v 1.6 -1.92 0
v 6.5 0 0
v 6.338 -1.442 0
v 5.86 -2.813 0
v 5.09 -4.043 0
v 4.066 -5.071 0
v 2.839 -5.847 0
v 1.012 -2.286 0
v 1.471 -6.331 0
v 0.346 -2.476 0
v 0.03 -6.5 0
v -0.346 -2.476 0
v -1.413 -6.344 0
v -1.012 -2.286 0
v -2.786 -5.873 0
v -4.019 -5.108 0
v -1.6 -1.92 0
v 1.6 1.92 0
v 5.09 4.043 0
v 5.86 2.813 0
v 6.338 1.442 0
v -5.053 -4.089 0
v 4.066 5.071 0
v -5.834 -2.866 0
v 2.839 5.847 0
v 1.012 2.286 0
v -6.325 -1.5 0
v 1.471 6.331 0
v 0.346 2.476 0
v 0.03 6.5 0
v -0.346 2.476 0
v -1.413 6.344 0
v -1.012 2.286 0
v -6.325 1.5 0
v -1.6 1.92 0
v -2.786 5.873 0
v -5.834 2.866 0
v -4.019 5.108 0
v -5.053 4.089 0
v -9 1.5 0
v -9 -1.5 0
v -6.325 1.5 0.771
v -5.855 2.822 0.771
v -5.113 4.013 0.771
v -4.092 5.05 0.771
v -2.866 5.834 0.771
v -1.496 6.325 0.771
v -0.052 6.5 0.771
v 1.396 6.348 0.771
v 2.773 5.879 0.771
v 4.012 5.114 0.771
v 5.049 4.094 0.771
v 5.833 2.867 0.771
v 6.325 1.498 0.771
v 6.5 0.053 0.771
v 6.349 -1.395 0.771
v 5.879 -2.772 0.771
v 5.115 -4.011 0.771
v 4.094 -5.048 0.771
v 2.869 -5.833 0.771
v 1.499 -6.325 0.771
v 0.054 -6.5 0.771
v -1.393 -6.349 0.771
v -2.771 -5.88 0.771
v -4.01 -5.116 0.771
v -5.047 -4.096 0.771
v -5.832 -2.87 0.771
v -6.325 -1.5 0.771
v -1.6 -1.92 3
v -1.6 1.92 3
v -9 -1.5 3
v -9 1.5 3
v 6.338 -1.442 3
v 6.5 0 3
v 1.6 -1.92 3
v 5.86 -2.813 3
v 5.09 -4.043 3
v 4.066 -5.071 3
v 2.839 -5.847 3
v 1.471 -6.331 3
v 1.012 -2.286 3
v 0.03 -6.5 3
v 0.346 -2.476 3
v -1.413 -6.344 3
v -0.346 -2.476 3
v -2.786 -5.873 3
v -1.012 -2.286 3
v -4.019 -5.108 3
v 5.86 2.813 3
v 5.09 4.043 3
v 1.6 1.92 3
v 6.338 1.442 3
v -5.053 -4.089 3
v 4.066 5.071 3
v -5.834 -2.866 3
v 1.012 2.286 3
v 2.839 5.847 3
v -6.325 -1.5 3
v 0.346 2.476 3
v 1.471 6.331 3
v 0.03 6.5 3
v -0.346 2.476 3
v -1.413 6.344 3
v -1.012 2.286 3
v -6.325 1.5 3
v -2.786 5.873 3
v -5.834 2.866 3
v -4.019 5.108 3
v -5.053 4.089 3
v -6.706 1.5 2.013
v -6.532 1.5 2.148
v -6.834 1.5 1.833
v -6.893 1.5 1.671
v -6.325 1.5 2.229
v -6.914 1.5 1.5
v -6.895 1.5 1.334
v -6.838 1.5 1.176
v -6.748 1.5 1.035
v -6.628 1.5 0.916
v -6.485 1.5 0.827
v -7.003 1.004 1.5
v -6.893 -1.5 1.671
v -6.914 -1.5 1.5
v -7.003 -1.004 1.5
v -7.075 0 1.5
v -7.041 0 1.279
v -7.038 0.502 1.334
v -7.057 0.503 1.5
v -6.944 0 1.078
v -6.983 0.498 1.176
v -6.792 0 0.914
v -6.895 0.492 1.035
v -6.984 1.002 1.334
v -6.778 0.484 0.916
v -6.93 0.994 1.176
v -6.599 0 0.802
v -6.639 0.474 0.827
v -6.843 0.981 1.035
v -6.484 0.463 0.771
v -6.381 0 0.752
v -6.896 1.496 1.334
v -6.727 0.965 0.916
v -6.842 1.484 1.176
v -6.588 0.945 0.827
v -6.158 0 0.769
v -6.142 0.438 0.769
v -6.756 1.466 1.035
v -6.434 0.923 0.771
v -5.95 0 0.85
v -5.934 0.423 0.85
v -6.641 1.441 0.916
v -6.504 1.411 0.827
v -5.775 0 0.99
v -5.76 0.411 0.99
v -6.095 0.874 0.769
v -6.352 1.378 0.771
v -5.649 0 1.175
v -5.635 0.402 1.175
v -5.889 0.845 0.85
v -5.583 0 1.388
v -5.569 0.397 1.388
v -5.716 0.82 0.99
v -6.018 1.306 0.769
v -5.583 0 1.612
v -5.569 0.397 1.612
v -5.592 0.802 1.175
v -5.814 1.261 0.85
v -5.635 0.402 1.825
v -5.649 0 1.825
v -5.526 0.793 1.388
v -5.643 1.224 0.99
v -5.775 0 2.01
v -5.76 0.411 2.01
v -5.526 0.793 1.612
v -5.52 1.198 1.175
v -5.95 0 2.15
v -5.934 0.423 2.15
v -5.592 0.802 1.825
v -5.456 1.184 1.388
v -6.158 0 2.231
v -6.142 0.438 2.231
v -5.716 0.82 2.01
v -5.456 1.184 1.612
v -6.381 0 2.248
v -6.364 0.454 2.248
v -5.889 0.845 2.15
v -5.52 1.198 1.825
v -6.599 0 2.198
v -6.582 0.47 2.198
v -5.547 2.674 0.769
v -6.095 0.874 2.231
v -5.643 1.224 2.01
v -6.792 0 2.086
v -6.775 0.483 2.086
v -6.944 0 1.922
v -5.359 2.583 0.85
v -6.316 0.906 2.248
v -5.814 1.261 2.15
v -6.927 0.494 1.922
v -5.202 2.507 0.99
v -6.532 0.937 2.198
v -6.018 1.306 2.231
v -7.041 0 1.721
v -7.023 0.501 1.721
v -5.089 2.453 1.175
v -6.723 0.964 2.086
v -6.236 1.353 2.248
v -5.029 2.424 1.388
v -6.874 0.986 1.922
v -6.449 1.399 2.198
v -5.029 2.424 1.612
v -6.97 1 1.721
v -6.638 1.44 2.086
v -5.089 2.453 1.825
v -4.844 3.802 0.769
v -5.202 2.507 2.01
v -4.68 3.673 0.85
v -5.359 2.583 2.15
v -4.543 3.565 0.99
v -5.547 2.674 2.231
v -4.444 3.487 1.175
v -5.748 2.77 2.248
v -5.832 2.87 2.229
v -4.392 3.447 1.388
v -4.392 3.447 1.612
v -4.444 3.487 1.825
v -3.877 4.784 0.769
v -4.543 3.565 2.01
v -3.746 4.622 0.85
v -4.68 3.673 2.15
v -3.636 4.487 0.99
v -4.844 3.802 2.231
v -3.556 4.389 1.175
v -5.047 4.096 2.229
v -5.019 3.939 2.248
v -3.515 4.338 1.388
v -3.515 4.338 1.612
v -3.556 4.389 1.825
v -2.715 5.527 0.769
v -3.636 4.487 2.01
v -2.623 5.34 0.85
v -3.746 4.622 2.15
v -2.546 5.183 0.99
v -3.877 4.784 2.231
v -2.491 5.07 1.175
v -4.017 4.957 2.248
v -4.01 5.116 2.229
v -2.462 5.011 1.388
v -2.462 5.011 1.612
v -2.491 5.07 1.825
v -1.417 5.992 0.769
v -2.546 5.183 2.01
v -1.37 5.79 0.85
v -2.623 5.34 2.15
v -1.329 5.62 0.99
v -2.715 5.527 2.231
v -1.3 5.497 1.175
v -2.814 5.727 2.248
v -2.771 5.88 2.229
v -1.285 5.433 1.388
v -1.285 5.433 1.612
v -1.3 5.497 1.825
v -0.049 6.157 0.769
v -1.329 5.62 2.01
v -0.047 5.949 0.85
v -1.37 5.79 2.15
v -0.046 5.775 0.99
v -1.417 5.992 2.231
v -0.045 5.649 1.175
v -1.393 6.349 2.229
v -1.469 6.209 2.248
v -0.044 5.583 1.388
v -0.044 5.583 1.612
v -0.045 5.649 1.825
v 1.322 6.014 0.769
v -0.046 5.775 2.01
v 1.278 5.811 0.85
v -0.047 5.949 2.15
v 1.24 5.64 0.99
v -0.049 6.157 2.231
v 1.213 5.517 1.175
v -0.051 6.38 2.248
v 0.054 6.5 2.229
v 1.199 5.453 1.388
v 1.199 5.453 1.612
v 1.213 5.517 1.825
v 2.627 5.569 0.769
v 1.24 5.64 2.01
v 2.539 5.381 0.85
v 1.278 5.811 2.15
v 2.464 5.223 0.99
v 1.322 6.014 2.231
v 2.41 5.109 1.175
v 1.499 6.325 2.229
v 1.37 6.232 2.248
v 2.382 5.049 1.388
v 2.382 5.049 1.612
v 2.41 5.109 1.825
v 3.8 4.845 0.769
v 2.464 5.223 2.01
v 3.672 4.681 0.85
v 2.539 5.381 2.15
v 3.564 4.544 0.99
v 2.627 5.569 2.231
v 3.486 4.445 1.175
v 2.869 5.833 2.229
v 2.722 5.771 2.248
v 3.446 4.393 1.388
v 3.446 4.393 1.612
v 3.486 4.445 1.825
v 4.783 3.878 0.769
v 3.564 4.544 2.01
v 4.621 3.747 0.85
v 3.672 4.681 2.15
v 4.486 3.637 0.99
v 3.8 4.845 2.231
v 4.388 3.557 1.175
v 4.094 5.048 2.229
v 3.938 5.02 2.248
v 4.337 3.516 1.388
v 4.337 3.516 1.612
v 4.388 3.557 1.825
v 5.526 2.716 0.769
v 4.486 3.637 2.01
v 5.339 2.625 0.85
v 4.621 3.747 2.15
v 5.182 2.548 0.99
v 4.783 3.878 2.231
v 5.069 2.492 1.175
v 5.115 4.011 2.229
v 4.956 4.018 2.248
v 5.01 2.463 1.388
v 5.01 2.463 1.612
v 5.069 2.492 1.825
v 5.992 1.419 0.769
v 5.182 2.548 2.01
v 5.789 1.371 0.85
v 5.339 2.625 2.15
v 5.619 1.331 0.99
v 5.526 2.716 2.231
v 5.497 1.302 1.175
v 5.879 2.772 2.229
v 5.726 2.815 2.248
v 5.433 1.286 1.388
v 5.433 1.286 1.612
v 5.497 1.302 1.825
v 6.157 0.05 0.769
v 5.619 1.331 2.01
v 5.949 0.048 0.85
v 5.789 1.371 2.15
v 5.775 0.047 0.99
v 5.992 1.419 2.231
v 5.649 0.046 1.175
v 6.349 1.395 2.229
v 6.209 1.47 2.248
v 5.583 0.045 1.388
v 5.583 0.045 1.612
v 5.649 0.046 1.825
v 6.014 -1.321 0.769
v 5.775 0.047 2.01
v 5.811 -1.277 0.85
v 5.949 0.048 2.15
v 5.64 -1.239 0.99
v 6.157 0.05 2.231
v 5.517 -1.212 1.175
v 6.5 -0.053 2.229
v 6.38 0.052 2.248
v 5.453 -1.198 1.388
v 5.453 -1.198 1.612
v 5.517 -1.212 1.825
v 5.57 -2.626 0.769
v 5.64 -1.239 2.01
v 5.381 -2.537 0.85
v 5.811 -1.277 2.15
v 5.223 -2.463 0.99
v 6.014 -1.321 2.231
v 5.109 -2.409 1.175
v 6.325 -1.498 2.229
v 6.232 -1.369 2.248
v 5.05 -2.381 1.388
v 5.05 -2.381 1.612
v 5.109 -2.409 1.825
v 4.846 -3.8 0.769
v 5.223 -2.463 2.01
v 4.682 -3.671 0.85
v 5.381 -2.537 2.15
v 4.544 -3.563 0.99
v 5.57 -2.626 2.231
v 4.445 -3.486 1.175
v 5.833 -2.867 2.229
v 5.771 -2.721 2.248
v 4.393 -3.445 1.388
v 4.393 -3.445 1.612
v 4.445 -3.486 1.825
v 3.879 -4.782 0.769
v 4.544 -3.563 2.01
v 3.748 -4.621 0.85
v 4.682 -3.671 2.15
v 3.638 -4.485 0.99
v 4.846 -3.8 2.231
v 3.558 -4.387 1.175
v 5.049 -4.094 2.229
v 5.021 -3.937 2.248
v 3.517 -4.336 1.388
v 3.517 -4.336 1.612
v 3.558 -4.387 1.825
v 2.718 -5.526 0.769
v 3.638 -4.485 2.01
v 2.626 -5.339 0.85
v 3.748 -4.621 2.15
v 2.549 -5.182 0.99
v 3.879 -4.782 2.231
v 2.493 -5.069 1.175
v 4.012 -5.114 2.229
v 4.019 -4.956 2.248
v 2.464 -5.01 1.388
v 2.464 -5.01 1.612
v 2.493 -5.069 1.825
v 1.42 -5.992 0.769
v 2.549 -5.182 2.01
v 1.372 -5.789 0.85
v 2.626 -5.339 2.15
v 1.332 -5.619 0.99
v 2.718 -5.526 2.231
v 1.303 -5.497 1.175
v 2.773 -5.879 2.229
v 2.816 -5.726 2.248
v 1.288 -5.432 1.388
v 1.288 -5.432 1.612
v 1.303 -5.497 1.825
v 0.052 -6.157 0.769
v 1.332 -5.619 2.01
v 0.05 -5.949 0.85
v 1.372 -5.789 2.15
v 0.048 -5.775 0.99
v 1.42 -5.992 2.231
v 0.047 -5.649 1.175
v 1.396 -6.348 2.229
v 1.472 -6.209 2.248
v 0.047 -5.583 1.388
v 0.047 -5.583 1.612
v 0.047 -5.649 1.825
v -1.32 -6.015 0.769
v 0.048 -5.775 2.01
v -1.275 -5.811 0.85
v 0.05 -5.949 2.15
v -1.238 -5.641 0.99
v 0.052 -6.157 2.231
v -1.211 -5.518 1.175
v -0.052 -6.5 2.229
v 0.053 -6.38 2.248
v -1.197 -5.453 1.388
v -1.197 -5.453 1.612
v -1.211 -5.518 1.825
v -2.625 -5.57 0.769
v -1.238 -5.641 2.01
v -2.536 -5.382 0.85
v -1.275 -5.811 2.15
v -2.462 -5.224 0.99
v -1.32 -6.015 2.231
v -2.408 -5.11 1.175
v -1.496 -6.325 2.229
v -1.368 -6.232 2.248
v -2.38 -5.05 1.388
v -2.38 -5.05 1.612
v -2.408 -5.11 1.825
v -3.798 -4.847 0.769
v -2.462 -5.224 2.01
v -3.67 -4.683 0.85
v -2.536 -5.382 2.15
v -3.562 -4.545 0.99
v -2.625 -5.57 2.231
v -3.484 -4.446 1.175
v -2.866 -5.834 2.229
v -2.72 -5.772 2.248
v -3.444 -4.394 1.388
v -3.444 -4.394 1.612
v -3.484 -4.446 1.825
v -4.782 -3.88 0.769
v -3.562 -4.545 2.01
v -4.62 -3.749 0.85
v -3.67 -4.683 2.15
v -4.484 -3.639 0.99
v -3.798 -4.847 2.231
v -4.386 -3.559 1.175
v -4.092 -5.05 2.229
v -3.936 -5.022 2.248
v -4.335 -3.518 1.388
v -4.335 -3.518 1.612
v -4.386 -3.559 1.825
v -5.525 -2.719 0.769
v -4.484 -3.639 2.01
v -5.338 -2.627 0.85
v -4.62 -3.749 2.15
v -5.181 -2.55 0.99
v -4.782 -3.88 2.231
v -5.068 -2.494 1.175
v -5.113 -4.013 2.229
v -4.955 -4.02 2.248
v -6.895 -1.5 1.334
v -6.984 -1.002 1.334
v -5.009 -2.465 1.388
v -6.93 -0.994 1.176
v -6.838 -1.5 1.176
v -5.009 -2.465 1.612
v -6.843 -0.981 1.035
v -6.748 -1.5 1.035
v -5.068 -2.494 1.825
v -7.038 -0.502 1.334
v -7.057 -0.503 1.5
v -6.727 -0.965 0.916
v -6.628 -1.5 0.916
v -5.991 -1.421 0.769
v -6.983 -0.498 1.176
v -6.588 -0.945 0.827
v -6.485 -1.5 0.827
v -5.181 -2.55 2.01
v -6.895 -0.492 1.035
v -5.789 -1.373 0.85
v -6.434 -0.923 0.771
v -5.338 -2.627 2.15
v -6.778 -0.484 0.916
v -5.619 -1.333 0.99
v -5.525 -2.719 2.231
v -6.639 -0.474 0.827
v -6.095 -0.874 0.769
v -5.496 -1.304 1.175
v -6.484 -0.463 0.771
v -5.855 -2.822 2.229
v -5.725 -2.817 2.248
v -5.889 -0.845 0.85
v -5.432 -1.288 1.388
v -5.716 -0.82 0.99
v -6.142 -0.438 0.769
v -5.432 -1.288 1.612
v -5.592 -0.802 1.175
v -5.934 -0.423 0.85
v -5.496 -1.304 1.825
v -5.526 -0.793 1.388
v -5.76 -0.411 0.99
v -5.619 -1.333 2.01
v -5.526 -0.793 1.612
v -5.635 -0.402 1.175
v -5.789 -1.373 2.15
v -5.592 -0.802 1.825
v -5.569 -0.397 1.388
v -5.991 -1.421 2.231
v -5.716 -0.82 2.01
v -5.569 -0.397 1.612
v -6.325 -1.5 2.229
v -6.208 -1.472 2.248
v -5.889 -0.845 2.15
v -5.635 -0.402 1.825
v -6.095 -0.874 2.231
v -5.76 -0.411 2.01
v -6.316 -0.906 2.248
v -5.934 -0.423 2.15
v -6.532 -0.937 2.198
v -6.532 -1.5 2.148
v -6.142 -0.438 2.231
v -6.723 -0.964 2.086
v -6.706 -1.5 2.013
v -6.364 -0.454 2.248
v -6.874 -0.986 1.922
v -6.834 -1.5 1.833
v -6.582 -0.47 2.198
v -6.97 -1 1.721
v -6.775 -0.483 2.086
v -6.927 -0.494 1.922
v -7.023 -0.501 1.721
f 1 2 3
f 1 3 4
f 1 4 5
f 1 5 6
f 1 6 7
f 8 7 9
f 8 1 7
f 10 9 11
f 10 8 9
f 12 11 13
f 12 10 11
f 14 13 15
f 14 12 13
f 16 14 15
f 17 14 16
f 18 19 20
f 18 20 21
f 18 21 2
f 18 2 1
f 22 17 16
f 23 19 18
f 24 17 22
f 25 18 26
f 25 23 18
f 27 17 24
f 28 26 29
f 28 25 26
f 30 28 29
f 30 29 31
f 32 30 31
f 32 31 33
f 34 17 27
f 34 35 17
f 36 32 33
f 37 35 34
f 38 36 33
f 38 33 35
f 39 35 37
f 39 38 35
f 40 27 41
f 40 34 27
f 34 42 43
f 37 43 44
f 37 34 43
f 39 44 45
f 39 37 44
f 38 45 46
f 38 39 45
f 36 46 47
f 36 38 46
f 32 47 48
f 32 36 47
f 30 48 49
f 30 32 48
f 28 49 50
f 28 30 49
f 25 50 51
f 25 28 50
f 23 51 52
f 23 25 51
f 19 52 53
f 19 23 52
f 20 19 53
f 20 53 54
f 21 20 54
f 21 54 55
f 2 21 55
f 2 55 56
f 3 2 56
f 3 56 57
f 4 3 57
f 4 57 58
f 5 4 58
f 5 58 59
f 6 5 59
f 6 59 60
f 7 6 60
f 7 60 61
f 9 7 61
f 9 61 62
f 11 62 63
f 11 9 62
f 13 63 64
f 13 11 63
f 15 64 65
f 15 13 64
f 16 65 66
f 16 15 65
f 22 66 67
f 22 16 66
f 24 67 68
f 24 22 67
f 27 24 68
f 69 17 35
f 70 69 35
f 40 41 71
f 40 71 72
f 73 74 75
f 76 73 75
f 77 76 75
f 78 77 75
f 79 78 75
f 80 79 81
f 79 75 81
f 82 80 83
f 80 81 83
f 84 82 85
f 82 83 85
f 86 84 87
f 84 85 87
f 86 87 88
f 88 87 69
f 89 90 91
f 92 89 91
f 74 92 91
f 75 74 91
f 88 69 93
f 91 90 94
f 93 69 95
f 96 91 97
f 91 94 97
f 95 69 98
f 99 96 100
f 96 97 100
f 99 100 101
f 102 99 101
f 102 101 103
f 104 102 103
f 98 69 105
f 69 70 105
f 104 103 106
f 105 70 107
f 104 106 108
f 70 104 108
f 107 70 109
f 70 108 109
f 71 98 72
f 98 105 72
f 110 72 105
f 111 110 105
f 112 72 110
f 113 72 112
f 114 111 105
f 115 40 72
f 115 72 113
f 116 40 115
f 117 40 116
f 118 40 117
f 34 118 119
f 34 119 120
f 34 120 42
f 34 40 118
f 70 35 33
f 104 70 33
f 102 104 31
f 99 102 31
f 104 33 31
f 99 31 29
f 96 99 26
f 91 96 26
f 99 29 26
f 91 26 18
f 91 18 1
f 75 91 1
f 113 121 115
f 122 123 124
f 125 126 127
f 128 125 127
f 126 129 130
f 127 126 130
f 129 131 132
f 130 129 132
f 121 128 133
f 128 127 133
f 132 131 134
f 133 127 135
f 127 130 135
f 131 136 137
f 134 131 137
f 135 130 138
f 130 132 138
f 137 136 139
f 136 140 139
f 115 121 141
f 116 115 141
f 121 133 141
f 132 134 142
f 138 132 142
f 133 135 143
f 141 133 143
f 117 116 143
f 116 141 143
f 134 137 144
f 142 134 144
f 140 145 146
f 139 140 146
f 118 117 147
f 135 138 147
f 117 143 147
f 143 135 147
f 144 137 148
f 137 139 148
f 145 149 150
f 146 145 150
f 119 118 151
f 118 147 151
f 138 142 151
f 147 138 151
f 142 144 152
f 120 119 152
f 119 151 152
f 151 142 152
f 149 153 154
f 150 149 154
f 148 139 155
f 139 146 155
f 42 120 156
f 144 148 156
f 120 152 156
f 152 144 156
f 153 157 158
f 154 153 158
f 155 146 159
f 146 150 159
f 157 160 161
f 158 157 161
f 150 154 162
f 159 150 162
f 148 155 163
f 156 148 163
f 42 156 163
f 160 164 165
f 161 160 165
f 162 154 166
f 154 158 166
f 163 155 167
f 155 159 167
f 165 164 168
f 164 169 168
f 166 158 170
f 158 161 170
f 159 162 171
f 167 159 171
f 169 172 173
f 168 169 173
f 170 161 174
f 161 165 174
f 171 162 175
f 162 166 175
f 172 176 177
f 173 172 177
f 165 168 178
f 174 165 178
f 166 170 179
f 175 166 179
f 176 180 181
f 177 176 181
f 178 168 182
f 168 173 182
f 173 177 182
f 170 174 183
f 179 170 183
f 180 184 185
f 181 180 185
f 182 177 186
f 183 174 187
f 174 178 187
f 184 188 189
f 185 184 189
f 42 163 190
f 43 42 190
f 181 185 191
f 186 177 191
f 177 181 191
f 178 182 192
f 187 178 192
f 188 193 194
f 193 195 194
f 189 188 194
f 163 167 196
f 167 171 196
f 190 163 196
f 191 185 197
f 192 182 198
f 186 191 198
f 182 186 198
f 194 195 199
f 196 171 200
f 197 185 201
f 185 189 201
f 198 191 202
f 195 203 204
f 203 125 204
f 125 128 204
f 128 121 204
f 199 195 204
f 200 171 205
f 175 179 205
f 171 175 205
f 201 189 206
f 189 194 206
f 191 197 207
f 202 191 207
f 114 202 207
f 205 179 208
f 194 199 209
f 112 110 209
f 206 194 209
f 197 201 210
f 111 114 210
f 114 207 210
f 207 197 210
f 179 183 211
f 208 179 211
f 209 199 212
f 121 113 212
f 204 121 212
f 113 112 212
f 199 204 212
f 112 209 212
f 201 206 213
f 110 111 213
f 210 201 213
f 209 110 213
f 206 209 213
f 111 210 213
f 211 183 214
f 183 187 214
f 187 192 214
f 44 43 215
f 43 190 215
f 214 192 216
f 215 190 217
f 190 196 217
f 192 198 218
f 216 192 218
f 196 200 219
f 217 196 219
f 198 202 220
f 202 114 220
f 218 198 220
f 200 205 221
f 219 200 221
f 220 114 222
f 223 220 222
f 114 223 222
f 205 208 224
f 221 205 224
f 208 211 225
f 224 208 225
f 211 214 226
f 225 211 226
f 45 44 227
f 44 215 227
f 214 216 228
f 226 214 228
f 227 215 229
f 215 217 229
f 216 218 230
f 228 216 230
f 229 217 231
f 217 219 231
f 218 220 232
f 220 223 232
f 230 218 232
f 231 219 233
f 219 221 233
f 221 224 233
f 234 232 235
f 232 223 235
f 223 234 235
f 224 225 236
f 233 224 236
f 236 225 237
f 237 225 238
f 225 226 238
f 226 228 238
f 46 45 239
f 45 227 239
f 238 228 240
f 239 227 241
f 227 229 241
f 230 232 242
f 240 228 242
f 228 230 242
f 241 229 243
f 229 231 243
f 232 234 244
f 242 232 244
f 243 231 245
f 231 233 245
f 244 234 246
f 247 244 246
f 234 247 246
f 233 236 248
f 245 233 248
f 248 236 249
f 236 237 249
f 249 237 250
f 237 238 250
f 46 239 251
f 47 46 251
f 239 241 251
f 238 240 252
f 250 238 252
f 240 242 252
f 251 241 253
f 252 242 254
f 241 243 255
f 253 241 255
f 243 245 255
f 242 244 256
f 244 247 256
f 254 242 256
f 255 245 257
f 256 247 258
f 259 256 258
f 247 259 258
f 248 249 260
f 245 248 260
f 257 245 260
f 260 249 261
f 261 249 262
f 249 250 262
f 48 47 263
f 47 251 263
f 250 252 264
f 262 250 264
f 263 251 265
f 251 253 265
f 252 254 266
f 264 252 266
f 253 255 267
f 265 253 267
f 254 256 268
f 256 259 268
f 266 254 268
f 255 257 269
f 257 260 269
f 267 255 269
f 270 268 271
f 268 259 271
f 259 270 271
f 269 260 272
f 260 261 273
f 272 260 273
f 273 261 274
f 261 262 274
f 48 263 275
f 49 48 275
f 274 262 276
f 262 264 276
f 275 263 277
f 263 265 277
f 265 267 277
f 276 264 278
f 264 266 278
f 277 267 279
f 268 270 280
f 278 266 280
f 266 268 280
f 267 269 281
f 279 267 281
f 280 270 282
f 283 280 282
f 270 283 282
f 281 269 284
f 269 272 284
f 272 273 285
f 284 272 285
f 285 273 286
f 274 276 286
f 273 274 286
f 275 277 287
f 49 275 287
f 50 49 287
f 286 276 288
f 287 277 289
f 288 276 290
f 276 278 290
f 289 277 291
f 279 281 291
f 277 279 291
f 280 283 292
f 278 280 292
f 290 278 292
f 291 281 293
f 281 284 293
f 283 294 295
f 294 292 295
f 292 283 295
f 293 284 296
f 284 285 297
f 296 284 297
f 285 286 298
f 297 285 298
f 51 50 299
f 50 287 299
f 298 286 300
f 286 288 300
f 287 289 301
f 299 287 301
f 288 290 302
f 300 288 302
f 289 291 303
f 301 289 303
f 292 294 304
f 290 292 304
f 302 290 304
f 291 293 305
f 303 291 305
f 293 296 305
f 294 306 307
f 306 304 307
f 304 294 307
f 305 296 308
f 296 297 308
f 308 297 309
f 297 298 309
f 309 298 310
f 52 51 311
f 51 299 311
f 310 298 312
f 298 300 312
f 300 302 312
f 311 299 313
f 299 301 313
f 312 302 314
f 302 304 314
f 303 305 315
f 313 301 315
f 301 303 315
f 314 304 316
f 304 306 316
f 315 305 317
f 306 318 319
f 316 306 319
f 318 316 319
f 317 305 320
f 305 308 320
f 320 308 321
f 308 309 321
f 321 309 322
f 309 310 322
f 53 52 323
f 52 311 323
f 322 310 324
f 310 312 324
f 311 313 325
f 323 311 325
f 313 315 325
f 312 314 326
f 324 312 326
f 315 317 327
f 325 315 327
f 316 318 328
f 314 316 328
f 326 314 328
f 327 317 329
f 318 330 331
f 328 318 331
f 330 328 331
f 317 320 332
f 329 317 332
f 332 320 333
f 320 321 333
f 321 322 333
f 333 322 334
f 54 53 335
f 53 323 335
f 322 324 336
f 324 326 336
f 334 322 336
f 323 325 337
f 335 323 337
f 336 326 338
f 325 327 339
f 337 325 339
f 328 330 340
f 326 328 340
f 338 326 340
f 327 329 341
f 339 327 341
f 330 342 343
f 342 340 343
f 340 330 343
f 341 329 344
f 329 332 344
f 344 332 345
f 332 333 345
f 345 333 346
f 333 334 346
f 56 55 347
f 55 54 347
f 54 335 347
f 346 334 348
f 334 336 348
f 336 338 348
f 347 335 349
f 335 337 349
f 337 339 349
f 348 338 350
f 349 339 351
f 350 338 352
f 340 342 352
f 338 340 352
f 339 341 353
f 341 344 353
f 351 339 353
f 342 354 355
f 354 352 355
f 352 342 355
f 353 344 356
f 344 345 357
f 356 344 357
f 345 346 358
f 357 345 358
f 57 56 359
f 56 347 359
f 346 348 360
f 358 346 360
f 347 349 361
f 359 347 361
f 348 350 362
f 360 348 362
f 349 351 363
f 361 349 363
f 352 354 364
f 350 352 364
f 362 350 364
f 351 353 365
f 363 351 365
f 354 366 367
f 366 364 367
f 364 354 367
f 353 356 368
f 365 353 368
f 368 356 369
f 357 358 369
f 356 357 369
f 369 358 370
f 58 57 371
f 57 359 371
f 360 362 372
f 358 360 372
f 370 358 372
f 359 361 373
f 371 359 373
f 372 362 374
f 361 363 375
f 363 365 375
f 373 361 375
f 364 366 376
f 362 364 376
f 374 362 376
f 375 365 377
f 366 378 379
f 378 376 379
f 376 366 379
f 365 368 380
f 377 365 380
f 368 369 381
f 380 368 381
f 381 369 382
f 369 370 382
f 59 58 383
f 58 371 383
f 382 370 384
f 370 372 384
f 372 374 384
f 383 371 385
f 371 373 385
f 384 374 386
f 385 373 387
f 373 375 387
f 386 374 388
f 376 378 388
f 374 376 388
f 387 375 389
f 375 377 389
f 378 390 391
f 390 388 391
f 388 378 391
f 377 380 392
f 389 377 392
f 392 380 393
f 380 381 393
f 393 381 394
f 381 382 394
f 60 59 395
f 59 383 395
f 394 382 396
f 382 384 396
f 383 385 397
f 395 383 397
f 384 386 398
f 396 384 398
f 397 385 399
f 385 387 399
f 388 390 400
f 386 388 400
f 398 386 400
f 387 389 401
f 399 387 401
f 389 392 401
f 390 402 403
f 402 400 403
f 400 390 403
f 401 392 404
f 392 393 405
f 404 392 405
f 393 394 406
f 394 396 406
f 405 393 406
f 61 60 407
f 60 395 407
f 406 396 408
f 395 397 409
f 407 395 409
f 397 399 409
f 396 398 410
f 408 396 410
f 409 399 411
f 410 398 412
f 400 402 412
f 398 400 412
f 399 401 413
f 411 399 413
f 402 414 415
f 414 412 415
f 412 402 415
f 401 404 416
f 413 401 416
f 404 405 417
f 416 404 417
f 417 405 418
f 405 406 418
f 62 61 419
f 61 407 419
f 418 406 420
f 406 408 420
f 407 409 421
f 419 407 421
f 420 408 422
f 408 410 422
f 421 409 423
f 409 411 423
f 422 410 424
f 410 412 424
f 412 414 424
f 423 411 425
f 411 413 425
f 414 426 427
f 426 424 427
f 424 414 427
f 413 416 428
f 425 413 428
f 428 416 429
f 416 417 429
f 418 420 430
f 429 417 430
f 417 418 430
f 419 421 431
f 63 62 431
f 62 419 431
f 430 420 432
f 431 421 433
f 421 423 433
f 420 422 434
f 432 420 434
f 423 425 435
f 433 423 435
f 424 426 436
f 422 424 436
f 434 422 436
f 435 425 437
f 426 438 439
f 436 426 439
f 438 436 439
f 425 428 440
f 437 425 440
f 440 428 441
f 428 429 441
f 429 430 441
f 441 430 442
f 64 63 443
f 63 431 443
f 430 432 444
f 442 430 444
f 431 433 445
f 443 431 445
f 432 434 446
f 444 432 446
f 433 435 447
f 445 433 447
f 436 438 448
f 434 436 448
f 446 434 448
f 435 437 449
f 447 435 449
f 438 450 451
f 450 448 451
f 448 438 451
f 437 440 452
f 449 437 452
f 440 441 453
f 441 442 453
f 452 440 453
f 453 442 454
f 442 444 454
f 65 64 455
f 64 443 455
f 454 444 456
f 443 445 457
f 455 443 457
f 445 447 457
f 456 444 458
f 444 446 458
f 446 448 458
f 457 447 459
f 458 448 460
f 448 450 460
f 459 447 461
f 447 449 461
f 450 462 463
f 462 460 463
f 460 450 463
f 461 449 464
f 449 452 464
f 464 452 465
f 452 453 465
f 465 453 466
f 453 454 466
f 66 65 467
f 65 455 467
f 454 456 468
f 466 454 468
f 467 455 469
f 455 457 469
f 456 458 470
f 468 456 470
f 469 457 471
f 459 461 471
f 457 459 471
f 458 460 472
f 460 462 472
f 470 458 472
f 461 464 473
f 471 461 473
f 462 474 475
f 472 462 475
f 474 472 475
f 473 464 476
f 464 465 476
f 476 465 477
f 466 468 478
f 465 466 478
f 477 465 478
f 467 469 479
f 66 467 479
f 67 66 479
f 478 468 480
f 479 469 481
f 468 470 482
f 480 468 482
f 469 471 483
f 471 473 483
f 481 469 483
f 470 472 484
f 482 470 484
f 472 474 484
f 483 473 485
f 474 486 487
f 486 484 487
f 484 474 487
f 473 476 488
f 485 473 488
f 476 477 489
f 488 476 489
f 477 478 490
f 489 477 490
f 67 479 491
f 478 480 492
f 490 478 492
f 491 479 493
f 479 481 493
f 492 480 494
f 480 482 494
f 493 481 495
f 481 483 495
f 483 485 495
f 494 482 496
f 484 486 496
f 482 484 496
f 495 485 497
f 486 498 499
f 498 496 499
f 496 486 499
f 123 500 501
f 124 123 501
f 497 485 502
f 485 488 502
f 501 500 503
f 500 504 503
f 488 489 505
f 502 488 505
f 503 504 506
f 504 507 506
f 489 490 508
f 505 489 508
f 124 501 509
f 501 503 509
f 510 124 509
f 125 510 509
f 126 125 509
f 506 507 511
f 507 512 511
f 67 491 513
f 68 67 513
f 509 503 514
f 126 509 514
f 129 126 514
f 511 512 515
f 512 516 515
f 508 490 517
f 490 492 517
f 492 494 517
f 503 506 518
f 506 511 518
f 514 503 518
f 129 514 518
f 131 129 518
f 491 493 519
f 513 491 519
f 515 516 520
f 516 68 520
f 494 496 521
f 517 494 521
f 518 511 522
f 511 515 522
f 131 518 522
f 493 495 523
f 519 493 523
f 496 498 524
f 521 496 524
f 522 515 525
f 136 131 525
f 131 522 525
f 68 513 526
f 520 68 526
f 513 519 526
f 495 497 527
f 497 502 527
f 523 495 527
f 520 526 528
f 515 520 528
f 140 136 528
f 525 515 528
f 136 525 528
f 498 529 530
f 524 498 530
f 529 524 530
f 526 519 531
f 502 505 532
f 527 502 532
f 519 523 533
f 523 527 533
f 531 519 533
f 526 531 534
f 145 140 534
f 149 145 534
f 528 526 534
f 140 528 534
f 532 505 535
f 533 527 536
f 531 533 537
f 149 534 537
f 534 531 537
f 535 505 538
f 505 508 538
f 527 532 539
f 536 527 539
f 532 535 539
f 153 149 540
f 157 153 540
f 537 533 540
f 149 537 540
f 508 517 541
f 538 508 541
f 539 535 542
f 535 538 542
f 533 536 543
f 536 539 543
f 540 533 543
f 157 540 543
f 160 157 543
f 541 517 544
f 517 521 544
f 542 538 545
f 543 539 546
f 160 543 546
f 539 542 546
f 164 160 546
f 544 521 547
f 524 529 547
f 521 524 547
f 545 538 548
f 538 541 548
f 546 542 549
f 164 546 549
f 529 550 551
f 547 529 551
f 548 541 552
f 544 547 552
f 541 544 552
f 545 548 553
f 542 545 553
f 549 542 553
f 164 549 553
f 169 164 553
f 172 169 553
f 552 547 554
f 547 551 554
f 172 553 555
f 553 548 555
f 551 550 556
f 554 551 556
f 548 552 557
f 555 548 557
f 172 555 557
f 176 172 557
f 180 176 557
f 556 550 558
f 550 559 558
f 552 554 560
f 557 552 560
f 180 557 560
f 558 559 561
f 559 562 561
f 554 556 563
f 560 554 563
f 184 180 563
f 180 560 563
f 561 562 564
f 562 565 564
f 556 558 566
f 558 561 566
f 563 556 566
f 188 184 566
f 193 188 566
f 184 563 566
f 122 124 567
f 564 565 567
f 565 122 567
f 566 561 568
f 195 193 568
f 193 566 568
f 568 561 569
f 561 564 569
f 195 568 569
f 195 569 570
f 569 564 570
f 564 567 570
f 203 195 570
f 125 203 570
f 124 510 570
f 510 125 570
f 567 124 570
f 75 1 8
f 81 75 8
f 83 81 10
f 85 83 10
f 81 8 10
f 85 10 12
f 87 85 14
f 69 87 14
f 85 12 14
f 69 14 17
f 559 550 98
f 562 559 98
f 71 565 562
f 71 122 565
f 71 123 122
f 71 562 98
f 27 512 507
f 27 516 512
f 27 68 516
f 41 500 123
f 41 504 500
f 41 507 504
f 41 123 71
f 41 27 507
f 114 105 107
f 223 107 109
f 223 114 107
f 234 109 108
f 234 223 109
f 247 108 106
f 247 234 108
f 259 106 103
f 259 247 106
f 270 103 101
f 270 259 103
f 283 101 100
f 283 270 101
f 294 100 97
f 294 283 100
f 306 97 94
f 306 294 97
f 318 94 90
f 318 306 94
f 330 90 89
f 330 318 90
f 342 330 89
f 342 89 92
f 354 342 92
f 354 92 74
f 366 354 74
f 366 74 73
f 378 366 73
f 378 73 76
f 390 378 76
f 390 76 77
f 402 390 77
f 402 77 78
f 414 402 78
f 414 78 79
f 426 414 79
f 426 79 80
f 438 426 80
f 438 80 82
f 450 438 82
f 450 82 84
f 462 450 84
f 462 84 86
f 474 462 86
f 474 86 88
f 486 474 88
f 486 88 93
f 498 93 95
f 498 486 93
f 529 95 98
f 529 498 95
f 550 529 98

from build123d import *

# Parameters (mm, degrees)
EXTRUDE_1_DEPTH = 3
SKETCH_4_R      = 0.75


with BuildPart() as part:
    # Эскиз1 → Бобышка-Вытянуть1 (new body)
    with BuildSketch(Plane.XY):
        with BuildLine():
            Line((-9, 1.5), (-6.32455532, 1.5))
            ThreePointArc((-6.32455532, 1.5), (6.5, 0), (-6.32455532, -1.5))
            Line((-6.32455532, -1.5), (-9, -1.5))
            Line((-9, -1.5), (-9, 1.5))
        make_face()
        with BuildLine():
            Line((-1.6, 0), (-1.6, 1.92045554))
            ThreePointArc((-1.6, 1.92045554), (0, 2.499629869), (1.6, 1.92045554))
            Line((1.6, 1.92045554), (1.6, -1.92045554))
            ThreePointArc((1.6, -1.92045554), (0, -2.499629869), (-1.6, -1.92045554))
            Line((-1.6, -1.92045554), (-1.6, 0))
        make_face(mode=Mode.SUBTRACT)
    extrude(amount=EXTRUDE_1_DEPTH)

    # Эскиз4 → Вырез-Повернуть1 (revolve, cut)
    with BuildSketch(Plane(origin=(0, 0, 0), x_dir=(-1, 0, 0), z_dir=(0, -1, 0))):
        with Locations((6.32455532, -1.5)):
            Circle(SKETCH_4_R)
    revolve(axis=Axis((0, 0, 0), (0, 0, -1)), mode=Mode.SUBTRACT)


solid = part.part
